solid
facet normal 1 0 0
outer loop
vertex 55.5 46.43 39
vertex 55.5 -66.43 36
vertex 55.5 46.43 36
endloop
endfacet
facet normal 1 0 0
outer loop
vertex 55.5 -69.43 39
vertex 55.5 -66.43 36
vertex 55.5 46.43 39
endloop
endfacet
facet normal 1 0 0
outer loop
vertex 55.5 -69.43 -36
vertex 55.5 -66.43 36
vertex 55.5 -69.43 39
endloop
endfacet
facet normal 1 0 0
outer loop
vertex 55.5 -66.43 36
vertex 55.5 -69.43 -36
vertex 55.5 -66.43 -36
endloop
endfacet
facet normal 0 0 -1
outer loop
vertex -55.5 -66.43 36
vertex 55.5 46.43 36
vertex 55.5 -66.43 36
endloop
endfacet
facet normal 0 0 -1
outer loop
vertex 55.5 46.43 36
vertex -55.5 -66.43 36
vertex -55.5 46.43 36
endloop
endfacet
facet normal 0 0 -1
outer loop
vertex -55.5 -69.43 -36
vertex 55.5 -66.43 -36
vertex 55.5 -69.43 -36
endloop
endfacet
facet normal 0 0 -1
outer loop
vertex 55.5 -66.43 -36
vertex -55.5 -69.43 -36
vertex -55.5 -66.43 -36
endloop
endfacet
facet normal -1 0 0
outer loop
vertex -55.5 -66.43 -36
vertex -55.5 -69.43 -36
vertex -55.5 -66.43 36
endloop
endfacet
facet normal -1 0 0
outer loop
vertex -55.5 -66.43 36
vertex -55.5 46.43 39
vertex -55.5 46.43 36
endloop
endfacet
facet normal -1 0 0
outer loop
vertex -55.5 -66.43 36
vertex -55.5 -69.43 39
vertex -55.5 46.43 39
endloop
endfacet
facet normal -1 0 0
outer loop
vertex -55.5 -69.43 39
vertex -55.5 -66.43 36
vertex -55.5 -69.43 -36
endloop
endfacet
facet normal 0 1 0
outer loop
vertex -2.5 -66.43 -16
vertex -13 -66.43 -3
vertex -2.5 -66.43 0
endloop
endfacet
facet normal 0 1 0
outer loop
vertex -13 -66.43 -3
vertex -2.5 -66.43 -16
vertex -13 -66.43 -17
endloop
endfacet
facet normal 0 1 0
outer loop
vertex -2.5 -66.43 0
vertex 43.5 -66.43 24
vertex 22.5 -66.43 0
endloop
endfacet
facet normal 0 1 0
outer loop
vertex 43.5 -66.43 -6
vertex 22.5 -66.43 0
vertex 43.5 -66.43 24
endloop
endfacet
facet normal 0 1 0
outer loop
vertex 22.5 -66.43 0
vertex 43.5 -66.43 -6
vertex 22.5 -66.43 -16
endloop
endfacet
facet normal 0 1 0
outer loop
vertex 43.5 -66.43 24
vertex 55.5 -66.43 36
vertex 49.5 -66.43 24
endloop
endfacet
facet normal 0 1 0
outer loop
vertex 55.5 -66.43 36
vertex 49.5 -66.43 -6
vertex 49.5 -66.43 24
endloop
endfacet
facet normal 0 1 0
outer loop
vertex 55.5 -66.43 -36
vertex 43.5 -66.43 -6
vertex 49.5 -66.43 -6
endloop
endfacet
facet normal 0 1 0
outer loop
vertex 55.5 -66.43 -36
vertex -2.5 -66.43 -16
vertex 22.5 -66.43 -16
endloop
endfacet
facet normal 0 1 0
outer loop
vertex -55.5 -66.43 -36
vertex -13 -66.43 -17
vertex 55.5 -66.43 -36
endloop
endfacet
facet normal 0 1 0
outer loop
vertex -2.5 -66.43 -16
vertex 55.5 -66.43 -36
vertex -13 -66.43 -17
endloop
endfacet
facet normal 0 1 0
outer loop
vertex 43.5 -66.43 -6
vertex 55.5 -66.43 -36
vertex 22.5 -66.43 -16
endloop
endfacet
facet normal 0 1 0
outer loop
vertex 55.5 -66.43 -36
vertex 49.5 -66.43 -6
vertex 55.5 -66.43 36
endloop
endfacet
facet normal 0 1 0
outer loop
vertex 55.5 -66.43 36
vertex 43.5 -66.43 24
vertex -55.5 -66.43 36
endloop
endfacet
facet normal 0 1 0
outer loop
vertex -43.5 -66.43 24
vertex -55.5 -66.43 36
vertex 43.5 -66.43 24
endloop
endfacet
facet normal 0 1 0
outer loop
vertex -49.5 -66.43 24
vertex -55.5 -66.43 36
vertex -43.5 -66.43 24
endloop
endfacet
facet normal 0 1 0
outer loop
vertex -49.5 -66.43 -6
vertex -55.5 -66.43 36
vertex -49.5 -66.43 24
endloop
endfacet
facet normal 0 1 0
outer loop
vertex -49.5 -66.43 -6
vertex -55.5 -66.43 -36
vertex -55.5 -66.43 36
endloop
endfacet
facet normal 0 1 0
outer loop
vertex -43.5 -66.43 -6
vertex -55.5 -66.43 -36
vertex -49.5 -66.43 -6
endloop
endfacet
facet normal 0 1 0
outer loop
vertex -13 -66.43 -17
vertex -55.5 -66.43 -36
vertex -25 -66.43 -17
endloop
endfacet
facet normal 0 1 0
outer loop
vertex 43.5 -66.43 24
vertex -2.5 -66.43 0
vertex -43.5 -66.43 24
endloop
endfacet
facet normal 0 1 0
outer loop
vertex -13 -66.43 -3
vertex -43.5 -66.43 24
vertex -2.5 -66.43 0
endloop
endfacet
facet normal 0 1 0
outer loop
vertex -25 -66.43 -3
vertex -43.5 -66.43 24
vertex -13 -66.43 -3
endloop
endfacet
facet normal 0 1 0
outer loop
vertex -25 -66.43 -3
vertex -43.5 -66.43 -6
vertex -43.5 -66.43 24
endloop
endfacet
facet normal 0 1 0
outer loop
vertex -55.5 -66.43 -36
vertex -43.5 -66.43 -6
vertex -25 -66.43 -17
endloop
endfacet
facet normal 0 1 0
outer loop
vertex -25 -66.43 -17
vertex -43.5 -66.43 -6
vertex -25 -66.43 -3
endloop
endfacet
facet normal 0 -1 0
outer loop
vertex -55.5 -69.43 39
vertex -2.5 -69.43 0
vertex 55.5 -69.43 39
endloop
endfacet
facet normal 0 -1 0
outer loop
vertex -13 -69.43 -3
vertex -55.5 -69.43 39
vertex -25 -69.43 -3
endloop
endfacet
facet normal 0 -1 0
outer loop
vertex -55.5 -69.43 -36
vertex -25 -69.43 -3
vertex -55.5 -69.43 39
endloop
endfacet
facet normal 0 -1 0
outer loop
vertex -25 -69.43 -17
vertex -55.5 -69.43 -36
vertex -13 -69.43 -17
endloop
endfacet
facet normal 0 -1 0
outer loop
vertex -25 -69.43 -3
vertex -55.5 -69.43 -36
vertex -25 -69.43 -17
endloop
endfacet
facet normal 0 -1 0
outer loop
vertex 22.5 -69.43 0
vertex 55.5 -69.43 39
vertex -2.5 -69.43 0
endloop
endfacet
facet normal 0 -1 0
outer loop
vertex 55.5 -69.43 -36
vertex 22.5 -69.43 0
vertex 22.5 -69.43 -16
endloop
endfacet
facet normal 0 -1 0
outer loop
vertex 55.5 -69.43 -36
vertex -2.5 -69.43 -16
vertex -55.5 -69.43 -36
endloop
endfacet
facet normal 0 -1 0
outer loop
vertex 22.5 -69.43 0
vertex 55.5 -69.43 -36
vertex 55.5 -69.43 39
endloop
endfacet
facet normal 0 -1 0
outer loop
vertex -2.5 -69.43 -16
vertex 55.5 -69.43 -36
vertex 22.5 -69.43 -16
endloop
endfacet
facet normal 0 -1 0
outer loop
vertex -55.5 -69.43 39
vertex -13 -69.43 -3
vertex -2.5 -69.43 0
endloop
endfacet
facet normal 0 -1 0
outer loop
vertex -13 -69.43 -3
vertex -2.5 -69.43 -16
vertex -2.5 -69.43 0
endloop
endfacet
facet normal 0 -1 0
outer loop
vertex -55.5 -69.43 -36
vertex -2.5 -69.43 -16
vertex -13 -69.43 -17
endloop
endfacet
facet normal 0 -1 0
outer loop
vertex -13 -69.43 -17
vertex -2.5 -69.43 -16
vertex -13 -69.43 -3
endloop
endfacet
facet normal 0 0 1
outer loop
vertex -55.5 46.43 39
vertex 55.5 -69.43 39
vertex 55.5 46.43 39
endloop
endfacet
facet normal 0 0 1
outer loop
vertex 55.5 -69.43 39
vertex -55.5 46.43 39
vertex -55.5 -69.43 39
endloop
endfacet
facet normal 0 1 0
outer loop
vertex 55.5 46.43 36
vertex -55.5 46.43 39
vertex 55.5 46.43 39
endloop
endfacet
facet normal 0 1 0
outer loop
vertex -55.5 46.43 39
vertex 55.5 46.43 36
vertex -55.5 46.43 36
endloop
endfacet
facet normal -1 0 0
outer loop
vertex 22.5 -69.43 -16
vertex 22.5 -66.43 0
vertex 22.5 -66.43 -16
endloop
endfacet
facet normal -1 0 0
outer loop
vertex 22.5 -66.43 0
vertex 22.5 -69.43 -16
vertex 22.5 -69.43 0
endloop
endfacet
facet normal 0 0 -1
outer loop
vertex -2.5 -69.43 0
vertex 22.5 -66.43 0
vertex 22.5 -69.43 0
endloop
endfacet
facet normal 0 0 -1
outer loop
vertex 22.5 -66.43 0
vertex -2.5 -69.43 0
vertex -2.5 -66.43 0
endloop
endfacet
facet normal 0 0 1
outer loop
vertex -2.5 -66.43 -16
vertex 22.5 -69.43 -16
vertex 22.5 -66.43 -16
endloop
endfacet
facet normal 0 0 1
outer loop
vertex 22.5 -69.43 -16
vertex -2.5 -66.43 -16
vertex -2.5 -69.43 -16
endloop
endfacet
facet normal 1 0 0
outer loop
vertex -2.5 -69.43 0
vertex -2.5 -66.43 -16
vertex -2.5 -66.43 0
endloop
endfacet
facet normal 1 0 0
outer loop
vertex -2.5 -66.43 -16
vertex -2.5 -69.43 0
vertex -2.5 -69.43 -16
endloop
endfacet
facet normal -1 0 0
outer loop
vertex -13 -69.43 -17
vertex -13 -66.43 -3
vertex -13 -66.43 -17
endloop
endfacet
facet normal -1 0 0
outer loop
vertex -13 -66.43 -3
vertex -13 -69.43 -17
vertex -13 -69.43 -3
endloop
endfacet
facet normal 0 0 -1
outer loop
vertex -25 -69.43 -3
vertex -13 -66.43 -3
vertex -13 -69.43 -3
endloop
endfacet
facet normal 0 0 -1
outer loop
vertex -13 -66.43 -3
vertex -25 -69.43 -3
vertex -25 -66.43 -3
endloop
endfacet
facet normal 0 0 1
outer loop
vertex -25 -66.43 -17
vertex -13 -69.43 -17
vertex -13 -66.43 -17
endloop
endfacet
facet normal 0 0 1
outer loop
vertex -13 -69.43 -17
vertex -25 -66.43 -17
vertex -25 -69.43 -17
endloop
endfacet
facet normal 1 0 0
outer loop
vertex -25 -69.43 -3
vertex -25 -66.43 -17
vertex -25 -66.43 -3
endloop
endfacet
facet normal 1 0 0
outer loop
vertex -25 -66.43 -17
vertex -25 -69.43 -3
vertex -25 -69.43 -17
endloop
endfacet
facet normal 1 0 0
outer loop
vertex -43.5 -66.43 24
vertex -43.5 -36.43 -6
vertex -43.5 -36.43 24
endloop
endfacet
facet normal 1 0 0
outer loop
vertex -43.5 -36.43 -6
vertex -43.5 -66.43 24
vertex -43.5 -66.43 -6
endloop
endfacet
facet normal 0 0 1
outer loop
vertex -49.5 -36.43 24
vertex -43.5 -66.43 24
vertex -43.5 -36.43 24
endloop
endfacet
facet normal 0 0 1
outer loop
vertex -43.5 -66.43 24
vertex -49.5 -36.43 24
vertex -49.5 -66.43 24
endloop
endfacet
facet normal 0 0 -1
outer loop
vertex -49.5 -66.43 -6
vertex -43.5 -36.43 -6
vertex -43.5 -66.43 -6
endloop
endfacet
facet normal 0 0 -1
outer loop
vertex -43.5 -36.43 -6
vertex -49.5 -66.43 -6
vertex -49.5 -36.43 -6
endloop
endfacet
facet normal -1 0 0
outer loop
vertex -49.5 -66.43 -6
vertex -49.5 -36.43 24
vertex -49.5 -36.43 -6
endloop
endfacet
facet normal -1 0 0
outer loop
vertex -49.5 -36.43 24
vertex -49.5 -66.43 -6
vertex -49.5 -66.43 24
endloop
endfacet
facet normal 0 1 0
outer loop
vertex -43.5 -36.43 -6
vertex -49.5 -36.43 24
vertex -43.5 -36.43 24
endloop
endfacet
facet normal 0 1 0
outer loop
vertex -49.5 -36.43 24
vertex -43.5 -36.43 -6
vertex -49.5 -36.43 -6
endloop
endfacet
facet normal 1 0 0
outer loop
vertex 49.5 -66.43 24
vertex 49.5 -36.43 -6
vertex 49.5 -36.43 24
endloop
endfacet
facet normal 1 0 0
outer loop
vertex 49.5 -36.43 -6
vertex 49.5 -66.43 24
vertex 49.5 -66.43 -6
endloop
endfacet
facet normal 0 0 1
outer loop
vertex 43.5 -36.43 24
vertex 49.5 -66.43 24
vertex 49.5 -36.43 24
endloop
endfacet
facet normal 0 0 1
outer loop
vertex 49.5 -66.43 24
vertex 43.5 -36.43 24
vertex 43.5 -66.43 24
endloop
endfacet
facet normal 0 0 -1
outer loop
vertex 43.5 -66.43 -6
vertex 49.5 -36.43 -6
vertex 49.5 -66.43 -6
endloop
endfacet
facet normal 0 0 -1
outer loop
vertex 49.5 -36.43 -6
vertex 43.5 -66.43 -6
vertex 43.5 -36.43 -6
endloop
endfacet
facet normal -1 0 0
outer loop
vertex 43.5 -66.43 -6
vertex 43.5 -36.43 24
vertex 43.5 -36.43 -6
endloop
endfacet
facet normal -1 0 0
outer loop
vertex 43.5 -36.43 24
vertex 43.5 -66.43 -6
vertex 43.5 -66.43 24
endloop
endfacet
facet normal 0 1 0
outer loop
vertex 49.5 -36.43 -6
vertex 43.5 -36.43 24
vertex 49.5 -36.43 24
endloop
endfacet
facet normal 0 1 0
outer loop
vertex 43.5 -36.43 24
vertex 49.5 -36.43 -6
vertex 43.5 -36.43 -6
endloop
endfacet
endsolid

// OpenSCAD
// Carcasa para la placa de alta tensión

// Dimensiones que dan un resultado con sentido
//FootDia = 0.2;
//FootHole = 0.02;
//FootHeight = 0.2;
//Thick = 0.1;
//
//x = 3;
//y = 2;
//z = 1;
//dx = 0.4;
//dy = 0.4;
//dz = 0.4;
//rx = 0.1;
//ry = 1.8;
//rz = 0.1;

//DIMENSIONES DE LA PLACA
//9.4cm x 10.2 cm

//Dimensiones reales
//
FootDia = 8;    //Diametro del pie para la placa
FootHole = 0.1; //Agujero del tornillo
FootHeight = 14+2.6; //Altura del pie para la placa
Thick = 0.1;
Filet = 0.1;        //Constante que define el ancho de la base de los soportes para la placa

x = 114+2-5;
y = 115.3+2-4.44;
z = 70+2;
dx = 4+2;
dy = 4+2;
dz = 4+2;
rx = 1;
ry = 18;
rz = 1;

ex1 = 10;   //Espacio entre pared y placa del eje x en una dirección
ex2 = 3;    //Espacio entre pared y placa del eje x en la otra
ey1 = 3;    //Espacio entre pared y placa del eje y en una dirección
ey2 = 3.3;  //Espacio entre pared y placa del eje y en la otra

sx = 7;     //Espacio entre borde placa y pos. del agujero(+diametro)
sy = 5;    //Espacio entre el borde de la placa y la posicion del agujero (sumado el diametro)



// Posiciones de los soportes para la placa---------------
//pos_soportex1 = -x/2 + dx + ex2 + sx - FootDia/2;
//pos_soportex1 = -x/2 + dx - (FootDia+Filet)/2 + sx + ex2;
pos_soportex1 = -46.05+6-2.5;
pos_soportex3 = -46.05+6-2.5;
//pos_soportex2 = x/2 - dx - ex2 - sx + FootDia/2;
//pos_soportex2 = x/2 - dx + (FootDia+Filet)/2 - sx - ex1;
pos_soportex2 = 39.05+7-2.5;
pos_soportex4 = 39.05+7-2.5;
//pos_soportey1 = -y/2 + dy + ey1 + sy - FootDia/2;
//pos_soportey1 = -y/2 + dy+ ey1 + sy - (FootDia+Filet)/2;
pos_soportey1 = -48.7-5+2;
pos_soportey4 = -48.7-5+2;
//pos_soportey2 = y/2 - dy - ey2 - sy + FootDia/2;
//pos_soportey2 = y/2 - dy - ey2 - sy + (FootDia+Filet)/2;
pos_soportey2 = 48.4-6+2;
pos_soportey3 = 48.4-6+2;
pos_soportez = -(z-dz)/2;

//Agujero tubo---------------------------------------------------
//FUE CHEQUEADO
tubo_z = 16;
tubo_y = 8;
pos_tubo_x = x/2 - dx/4;
//pos_tubo_y = -y/2 + 45 - tubo_y/2;
pos_tubo_y = -y/2 -tubo_y/2 + 48;
//pos_tubo_z = -z/2 + 5 + 25 + tubo_z/2 + dz;
pos_tubo_z = -z/2 + tubo_z/2 + 30 - 10;
espesor_tubo = dx/2;

//Agujero Arduino-----------------------------------------------

arduino_x = 25;
arduino_z = 16;
pos_arduino_x = x/2 - arduino_x/2 - 33;
pos_arduino_y = -y/2 - dy/4;
pos_arduino_z = -z/2 + arduino_z/2 + 20 ;
espesor_arduino = dy/2;

//Agujero jack energía------------------------------------------

jack_x = 12;
jack_z = 14;
pos_jack_x = -x/2 + dx/4 + 33 + 4 - 2;
pos_jack_y = -y/2 - dy/4;
pos_jack_z = -z/2 + 23 + jack_z/2 - 4;
espesor_jack = dy/2;

//Ayuda para tornillo-------------------------------------------

tx = 10;
ty = 10;
tz = 35;
pos_tx = x/2-dx/2 - tx/2;
pos_ty = y/2-dy/2 - ty/2;
pos_tz = z/2 - tz/2;
d_tornillo = 2;

//Ayuda para tornillo tapa------------------------------------

//ttx = 70;
//tty = 12;
//ttz = 6;
ttx = 6;
tty = 30;
ttz = 30;
pos_ttx = -x/2 + ttx/2 + dx;
pos_tty = -y/2 + tty/2;
pos_ttz = -z/2 + ttz/2 + 30;

//Barras anti-flexibilidad--------------------------------------
off_z = 20;
off_x = 30;
bx = sqrt(pow(z-dz - off_z,2) + pow(y-dy,2)) - off_x;
by = dx/2;
bz = dx ;
pos_bx = x/2 - dx;
pos_by = y/2 - by/2 - dy/2;
pos_bz = z/2 - bz/4;
theta = atan((z-dz- off_z) / (y-dy));
alfa = atan((z-dz)/35);



module foot(FootDia,FootHole,FootHeight,Thick,Filet){
// Pie posa PCB
    // FootDia: diámetro de la parte donde se posa
    // FootHole: diámetro del agujero
    // FootHeigth: Altura del pie
    // Thick: cuanto se achica el pie para posar el PCB
    //Filet=2;  
    translate([0,0,0])
    difference(){
    
    difference(){
            //translate ([0,0,-Thick]){
                cylinder(d=FootDia+Filet,FootHeight-Thick, $fn=100);
                        //}
                    rotate_extrude($fn=100){
                            translate([(FootDia+Filet*2)/2,Filet,0]){
                                    minkowski(){
                                            square(10);
                                            circle(Filet, $fn=100);
                                        }
                                 }
                           }
                   }
            cylinder(d=FootHole,FootHeight+1, $fn=100);
               }          
}

module parte_inferior (x,y,z,dx,dy,dz,rx,ry,rz,tapa){
// Parte inferior de la placa de alta tensión
    
    // x: largo eje x
    // y: largo eje y
    // z: largo eje z
    // dx: grosor de la pared en el eje x
    // dy: grosor de la pared en el eje y
    // dz: grosor de la pared en el eje z
    // rx: largo del riel para encajar la tapa en el eje x
    // ry: largo del riel para encajar la tapa en el eje y
    // rz: largo del riel para encajar la tapa en el eje z
    //tapa: si vale 1 se genera la tapa, si vale 0, no
    
    difference(){
    
        cube([x,y,z],center=true);
        translate ([0,-dy/2,dz/2]) cube([x-dx,y,z],center=true);
//        translate ([x/2-dx/4,-(y-ry)/2,z/2-rz/2]) cube([rx,ry,rz],center=true);
//        translate ([-(x/2-dx/4),-(y-ry)/2,z/2-rz/2]) cube([rx,ry,rz],center=true);
//        translate ([-(x/2-dx/4),-(y-ry)/2,z/2-rz]) cube([rx*1.5,ry,rz],center=true);
//        translate ([x/2-dx/4,-(y-ry)/2,z/2-rz]) cube([rx*1.5,ry,rz],center=true);        
    }
}

module soporte_placa(x1,x2,x3,x4,y1,y2,y3,y4,z){
// Los cuatro pies donde se posa la placa

    translate ([x1,y1,z]) foot(FootDia,FootHole,FootHeight,Thick,Filet);
    translate ([x2,y2,z]) foot(FootDia,FootHole,FootHeight,Thick,Filet);
    translate ([x3,y3,z]) foot(FootDia,FootHole,FootHeight,Thick,Filet);
    translate ([x4,y4,z]) foot(FootDia,FootHole,FootHeight,Thick,Filet);  
    
    
}

//module tapa(x,y,z,dx,dy,dz,rx,ry,rz)
module tapa(x,y,z,dx,dy,dz)
{
    
    union(){
        translate ([0,-y/2-dy/4,0]) cube([x,dy/2,z],center=true);
        
        translate ([0,-dy/4,z/2+dz/4]) cube([x,y+dy/2,dz/2],center=true);
        
//        translate ([x/2-dx/4,-(y-ry)/2,z/2-rz]) cube([rx*1.5,ry,rz],center=true);
//        translate ([x/2-dx/4,-(y-ry)/2,z/2-rz/2]) cube([rx,ry,rz],center=true);
//        
//        translate ([-(x/2-dx/4),-(y-ry)/2,z/2-rz/2]) cube([rx,ry,rz],center=true);
//        translate ([-(x/2-dx/4),-(y-ry)/2,z/2-rz]) cube([rx*1.5,ry,rz],center=true);
        
        
        
    }
}

module agujero(dim_x,dim_y,dim_z,pos_x,pos_y,pos_z){
    
    translate ([pos_x,pos_y,pos_z]) cube([dim_x,dim_y,dim_z],center = true);    
}

module ayuda_para_tornillo(tx,ty,tz,pos_tx,pos_ty,pos_tz)
{
    translate([pos_tx,pos_ty,pos_tz]) cube([tx,ty,tz],center = true);
    
    translate([-pos_tx,pos_ty,pos_tz]) cube([tx,ty,tz],center = true);
    
    
    
//    difference(){
//        translate ([pos_tx,pos_ty,pos_tz]) cube([tx,ty,tz],center = true);
//        translate([pos_tx-(abs(pos_tx)/pos_tx)*tx/2,pos_ty-(abs(pos_tx)/pos_tx)*ty/2,pos_tz-tz/2]) rotate (a = [(abs(pos_tx)/pos_tx)*(-1)*90,-90,0]) linear_extrude(tx) polygon([[0,0],[tz,0],[0,ty]], paths=[[0,1,2]]);
//        translate([pos_tx+(abs(pos_tx)/pos_tx)*tx/4,pos_ty+ty/8,pos_tz + tz/2]) cylinder(h = tz/2 ,d = d_tornillo, $fn = 100,center = true);
//        
//        
//    }
}



module barras_anti_flex(bx,by,bz,theta)
{
    rotate (a = [0,theta,0]) cube ([bx,by,bz], center = true);
}

module placa()
{
    cube([94,102,2],center=true);
}

////////////////////// GENERACION DE LA PIEZA ////////////////////

////======================CAJA==========================\\
//
////rotate (a = [0,90,0]) 
//difference(){
//
module caja(){
union(){
difference(){
    parte_inferior (x,y,z,dx,dy,dz,rx,ry,rz);
    //Agujero del tubo
    agujero(espesor_tubo*2,tubo_y,tubo_z,pos_tubo_x,pos_tubo_y,pos_tubo_z);
    
}
//Soporte placa
soporte_placa (pos_soportex1,pos_soportex2,pos_soportex3,pos_soportex4,pos_soportey1,pos_soportey2,pos_soportey3,pos_soportey4,pos_soportez);

//Ayuda para tornillo
ayuda_para_tornillo(tx,ty,tz,pos_tx,pos_ty,pos_tz);
ayuda_para_tornillo(tx,ty,tz,-pos_tx,pos_ty,pos_tz);
//ayuda_para_tornillo(ty,tx,tz,-pos_tx+tx,pos_ty+tx,pos_tz);
//ayuda_para_tornillo(ty,tx,tz,+pos_tx-tx,pos_ty+tx,pos_tz);
////Ayuda para flexibilidad de caja
//translate ([0,pos_by,5]) barras_anti_flex(bx,by,bz,theta);
//
//translate ([0,pos_by,5]) barras_anti_flex(bx,by,bz,-theta);
//
//translate([-pos_bx,0,5]) rotate (a =[0,0,90]) barras_anti_flex(bx,by,bz,theta);
//
//translate([-pos_bx,0,5]) rotate (a =[0,0,90]) barras_anti_flex(bx,by,bz,-theta);
//
//translate([pos_bx,0,5]) rotate (a =[0,0,90]) barras_anti_flex(bx,by,bz,-theta);
//translate([pos_bx,-y/4,5]) rotate (a =[0,0,-90]) barras_anti_flex(bx-35,by,bz,-alfa);
//translate([pos_bx,y/6,5]) rotate (a =[0,0,-90]) barras_anti_flex(bx-35,by,bz,-alfa);


}
    //translate([-ex1,0,0]) cube([x,y,z],center=true);
//}
//translate ([0,0,z/3]) cube([x,y,z],center = true);


//}
}
module placa(){
%translate ([0,0,-z/2 + dz + pos_tubo_z+tubo_z]) placa();
}


//======================TAPA==========================\\

//difference()
//{
    
module tapa_final(){   
translate ([0,-10,0]) union(){
    difference(){
//        translate ([0,-y/3,0]) 
        tapa(x,y,z,dx,dy,dz);
        //Agujero del Arduino
        agujero(arduino_x,espesor_arduino*2,arduino_z,pos_arduino_x,pos_arduino_y,pos_arduino_z);
        //Agujero del jack de energía
        agujero(jack_x,espesor_jack*2,jack_z,pos_jack_x,pos_jack_y,pos_jack_z);
        
        
    }
    ayuda_para_tornillo(ttx,tty,ttz,pos_ttx,pos_tty,pos_ttz);
    //translate([0,0,pos_bz]) rotate (a =[90,0,0]) barras_anti_flex(bx,by,bz,-theta);
    //translate([0,0,pos_bz]) rotate (a =[-90,0,0]) barras_anti_flex(bx,by,bz,-theta);
    
}
}

//translate ([0,3,0]) cube([x,y,z],center = true);
//}
tapa_final();

//caja();
